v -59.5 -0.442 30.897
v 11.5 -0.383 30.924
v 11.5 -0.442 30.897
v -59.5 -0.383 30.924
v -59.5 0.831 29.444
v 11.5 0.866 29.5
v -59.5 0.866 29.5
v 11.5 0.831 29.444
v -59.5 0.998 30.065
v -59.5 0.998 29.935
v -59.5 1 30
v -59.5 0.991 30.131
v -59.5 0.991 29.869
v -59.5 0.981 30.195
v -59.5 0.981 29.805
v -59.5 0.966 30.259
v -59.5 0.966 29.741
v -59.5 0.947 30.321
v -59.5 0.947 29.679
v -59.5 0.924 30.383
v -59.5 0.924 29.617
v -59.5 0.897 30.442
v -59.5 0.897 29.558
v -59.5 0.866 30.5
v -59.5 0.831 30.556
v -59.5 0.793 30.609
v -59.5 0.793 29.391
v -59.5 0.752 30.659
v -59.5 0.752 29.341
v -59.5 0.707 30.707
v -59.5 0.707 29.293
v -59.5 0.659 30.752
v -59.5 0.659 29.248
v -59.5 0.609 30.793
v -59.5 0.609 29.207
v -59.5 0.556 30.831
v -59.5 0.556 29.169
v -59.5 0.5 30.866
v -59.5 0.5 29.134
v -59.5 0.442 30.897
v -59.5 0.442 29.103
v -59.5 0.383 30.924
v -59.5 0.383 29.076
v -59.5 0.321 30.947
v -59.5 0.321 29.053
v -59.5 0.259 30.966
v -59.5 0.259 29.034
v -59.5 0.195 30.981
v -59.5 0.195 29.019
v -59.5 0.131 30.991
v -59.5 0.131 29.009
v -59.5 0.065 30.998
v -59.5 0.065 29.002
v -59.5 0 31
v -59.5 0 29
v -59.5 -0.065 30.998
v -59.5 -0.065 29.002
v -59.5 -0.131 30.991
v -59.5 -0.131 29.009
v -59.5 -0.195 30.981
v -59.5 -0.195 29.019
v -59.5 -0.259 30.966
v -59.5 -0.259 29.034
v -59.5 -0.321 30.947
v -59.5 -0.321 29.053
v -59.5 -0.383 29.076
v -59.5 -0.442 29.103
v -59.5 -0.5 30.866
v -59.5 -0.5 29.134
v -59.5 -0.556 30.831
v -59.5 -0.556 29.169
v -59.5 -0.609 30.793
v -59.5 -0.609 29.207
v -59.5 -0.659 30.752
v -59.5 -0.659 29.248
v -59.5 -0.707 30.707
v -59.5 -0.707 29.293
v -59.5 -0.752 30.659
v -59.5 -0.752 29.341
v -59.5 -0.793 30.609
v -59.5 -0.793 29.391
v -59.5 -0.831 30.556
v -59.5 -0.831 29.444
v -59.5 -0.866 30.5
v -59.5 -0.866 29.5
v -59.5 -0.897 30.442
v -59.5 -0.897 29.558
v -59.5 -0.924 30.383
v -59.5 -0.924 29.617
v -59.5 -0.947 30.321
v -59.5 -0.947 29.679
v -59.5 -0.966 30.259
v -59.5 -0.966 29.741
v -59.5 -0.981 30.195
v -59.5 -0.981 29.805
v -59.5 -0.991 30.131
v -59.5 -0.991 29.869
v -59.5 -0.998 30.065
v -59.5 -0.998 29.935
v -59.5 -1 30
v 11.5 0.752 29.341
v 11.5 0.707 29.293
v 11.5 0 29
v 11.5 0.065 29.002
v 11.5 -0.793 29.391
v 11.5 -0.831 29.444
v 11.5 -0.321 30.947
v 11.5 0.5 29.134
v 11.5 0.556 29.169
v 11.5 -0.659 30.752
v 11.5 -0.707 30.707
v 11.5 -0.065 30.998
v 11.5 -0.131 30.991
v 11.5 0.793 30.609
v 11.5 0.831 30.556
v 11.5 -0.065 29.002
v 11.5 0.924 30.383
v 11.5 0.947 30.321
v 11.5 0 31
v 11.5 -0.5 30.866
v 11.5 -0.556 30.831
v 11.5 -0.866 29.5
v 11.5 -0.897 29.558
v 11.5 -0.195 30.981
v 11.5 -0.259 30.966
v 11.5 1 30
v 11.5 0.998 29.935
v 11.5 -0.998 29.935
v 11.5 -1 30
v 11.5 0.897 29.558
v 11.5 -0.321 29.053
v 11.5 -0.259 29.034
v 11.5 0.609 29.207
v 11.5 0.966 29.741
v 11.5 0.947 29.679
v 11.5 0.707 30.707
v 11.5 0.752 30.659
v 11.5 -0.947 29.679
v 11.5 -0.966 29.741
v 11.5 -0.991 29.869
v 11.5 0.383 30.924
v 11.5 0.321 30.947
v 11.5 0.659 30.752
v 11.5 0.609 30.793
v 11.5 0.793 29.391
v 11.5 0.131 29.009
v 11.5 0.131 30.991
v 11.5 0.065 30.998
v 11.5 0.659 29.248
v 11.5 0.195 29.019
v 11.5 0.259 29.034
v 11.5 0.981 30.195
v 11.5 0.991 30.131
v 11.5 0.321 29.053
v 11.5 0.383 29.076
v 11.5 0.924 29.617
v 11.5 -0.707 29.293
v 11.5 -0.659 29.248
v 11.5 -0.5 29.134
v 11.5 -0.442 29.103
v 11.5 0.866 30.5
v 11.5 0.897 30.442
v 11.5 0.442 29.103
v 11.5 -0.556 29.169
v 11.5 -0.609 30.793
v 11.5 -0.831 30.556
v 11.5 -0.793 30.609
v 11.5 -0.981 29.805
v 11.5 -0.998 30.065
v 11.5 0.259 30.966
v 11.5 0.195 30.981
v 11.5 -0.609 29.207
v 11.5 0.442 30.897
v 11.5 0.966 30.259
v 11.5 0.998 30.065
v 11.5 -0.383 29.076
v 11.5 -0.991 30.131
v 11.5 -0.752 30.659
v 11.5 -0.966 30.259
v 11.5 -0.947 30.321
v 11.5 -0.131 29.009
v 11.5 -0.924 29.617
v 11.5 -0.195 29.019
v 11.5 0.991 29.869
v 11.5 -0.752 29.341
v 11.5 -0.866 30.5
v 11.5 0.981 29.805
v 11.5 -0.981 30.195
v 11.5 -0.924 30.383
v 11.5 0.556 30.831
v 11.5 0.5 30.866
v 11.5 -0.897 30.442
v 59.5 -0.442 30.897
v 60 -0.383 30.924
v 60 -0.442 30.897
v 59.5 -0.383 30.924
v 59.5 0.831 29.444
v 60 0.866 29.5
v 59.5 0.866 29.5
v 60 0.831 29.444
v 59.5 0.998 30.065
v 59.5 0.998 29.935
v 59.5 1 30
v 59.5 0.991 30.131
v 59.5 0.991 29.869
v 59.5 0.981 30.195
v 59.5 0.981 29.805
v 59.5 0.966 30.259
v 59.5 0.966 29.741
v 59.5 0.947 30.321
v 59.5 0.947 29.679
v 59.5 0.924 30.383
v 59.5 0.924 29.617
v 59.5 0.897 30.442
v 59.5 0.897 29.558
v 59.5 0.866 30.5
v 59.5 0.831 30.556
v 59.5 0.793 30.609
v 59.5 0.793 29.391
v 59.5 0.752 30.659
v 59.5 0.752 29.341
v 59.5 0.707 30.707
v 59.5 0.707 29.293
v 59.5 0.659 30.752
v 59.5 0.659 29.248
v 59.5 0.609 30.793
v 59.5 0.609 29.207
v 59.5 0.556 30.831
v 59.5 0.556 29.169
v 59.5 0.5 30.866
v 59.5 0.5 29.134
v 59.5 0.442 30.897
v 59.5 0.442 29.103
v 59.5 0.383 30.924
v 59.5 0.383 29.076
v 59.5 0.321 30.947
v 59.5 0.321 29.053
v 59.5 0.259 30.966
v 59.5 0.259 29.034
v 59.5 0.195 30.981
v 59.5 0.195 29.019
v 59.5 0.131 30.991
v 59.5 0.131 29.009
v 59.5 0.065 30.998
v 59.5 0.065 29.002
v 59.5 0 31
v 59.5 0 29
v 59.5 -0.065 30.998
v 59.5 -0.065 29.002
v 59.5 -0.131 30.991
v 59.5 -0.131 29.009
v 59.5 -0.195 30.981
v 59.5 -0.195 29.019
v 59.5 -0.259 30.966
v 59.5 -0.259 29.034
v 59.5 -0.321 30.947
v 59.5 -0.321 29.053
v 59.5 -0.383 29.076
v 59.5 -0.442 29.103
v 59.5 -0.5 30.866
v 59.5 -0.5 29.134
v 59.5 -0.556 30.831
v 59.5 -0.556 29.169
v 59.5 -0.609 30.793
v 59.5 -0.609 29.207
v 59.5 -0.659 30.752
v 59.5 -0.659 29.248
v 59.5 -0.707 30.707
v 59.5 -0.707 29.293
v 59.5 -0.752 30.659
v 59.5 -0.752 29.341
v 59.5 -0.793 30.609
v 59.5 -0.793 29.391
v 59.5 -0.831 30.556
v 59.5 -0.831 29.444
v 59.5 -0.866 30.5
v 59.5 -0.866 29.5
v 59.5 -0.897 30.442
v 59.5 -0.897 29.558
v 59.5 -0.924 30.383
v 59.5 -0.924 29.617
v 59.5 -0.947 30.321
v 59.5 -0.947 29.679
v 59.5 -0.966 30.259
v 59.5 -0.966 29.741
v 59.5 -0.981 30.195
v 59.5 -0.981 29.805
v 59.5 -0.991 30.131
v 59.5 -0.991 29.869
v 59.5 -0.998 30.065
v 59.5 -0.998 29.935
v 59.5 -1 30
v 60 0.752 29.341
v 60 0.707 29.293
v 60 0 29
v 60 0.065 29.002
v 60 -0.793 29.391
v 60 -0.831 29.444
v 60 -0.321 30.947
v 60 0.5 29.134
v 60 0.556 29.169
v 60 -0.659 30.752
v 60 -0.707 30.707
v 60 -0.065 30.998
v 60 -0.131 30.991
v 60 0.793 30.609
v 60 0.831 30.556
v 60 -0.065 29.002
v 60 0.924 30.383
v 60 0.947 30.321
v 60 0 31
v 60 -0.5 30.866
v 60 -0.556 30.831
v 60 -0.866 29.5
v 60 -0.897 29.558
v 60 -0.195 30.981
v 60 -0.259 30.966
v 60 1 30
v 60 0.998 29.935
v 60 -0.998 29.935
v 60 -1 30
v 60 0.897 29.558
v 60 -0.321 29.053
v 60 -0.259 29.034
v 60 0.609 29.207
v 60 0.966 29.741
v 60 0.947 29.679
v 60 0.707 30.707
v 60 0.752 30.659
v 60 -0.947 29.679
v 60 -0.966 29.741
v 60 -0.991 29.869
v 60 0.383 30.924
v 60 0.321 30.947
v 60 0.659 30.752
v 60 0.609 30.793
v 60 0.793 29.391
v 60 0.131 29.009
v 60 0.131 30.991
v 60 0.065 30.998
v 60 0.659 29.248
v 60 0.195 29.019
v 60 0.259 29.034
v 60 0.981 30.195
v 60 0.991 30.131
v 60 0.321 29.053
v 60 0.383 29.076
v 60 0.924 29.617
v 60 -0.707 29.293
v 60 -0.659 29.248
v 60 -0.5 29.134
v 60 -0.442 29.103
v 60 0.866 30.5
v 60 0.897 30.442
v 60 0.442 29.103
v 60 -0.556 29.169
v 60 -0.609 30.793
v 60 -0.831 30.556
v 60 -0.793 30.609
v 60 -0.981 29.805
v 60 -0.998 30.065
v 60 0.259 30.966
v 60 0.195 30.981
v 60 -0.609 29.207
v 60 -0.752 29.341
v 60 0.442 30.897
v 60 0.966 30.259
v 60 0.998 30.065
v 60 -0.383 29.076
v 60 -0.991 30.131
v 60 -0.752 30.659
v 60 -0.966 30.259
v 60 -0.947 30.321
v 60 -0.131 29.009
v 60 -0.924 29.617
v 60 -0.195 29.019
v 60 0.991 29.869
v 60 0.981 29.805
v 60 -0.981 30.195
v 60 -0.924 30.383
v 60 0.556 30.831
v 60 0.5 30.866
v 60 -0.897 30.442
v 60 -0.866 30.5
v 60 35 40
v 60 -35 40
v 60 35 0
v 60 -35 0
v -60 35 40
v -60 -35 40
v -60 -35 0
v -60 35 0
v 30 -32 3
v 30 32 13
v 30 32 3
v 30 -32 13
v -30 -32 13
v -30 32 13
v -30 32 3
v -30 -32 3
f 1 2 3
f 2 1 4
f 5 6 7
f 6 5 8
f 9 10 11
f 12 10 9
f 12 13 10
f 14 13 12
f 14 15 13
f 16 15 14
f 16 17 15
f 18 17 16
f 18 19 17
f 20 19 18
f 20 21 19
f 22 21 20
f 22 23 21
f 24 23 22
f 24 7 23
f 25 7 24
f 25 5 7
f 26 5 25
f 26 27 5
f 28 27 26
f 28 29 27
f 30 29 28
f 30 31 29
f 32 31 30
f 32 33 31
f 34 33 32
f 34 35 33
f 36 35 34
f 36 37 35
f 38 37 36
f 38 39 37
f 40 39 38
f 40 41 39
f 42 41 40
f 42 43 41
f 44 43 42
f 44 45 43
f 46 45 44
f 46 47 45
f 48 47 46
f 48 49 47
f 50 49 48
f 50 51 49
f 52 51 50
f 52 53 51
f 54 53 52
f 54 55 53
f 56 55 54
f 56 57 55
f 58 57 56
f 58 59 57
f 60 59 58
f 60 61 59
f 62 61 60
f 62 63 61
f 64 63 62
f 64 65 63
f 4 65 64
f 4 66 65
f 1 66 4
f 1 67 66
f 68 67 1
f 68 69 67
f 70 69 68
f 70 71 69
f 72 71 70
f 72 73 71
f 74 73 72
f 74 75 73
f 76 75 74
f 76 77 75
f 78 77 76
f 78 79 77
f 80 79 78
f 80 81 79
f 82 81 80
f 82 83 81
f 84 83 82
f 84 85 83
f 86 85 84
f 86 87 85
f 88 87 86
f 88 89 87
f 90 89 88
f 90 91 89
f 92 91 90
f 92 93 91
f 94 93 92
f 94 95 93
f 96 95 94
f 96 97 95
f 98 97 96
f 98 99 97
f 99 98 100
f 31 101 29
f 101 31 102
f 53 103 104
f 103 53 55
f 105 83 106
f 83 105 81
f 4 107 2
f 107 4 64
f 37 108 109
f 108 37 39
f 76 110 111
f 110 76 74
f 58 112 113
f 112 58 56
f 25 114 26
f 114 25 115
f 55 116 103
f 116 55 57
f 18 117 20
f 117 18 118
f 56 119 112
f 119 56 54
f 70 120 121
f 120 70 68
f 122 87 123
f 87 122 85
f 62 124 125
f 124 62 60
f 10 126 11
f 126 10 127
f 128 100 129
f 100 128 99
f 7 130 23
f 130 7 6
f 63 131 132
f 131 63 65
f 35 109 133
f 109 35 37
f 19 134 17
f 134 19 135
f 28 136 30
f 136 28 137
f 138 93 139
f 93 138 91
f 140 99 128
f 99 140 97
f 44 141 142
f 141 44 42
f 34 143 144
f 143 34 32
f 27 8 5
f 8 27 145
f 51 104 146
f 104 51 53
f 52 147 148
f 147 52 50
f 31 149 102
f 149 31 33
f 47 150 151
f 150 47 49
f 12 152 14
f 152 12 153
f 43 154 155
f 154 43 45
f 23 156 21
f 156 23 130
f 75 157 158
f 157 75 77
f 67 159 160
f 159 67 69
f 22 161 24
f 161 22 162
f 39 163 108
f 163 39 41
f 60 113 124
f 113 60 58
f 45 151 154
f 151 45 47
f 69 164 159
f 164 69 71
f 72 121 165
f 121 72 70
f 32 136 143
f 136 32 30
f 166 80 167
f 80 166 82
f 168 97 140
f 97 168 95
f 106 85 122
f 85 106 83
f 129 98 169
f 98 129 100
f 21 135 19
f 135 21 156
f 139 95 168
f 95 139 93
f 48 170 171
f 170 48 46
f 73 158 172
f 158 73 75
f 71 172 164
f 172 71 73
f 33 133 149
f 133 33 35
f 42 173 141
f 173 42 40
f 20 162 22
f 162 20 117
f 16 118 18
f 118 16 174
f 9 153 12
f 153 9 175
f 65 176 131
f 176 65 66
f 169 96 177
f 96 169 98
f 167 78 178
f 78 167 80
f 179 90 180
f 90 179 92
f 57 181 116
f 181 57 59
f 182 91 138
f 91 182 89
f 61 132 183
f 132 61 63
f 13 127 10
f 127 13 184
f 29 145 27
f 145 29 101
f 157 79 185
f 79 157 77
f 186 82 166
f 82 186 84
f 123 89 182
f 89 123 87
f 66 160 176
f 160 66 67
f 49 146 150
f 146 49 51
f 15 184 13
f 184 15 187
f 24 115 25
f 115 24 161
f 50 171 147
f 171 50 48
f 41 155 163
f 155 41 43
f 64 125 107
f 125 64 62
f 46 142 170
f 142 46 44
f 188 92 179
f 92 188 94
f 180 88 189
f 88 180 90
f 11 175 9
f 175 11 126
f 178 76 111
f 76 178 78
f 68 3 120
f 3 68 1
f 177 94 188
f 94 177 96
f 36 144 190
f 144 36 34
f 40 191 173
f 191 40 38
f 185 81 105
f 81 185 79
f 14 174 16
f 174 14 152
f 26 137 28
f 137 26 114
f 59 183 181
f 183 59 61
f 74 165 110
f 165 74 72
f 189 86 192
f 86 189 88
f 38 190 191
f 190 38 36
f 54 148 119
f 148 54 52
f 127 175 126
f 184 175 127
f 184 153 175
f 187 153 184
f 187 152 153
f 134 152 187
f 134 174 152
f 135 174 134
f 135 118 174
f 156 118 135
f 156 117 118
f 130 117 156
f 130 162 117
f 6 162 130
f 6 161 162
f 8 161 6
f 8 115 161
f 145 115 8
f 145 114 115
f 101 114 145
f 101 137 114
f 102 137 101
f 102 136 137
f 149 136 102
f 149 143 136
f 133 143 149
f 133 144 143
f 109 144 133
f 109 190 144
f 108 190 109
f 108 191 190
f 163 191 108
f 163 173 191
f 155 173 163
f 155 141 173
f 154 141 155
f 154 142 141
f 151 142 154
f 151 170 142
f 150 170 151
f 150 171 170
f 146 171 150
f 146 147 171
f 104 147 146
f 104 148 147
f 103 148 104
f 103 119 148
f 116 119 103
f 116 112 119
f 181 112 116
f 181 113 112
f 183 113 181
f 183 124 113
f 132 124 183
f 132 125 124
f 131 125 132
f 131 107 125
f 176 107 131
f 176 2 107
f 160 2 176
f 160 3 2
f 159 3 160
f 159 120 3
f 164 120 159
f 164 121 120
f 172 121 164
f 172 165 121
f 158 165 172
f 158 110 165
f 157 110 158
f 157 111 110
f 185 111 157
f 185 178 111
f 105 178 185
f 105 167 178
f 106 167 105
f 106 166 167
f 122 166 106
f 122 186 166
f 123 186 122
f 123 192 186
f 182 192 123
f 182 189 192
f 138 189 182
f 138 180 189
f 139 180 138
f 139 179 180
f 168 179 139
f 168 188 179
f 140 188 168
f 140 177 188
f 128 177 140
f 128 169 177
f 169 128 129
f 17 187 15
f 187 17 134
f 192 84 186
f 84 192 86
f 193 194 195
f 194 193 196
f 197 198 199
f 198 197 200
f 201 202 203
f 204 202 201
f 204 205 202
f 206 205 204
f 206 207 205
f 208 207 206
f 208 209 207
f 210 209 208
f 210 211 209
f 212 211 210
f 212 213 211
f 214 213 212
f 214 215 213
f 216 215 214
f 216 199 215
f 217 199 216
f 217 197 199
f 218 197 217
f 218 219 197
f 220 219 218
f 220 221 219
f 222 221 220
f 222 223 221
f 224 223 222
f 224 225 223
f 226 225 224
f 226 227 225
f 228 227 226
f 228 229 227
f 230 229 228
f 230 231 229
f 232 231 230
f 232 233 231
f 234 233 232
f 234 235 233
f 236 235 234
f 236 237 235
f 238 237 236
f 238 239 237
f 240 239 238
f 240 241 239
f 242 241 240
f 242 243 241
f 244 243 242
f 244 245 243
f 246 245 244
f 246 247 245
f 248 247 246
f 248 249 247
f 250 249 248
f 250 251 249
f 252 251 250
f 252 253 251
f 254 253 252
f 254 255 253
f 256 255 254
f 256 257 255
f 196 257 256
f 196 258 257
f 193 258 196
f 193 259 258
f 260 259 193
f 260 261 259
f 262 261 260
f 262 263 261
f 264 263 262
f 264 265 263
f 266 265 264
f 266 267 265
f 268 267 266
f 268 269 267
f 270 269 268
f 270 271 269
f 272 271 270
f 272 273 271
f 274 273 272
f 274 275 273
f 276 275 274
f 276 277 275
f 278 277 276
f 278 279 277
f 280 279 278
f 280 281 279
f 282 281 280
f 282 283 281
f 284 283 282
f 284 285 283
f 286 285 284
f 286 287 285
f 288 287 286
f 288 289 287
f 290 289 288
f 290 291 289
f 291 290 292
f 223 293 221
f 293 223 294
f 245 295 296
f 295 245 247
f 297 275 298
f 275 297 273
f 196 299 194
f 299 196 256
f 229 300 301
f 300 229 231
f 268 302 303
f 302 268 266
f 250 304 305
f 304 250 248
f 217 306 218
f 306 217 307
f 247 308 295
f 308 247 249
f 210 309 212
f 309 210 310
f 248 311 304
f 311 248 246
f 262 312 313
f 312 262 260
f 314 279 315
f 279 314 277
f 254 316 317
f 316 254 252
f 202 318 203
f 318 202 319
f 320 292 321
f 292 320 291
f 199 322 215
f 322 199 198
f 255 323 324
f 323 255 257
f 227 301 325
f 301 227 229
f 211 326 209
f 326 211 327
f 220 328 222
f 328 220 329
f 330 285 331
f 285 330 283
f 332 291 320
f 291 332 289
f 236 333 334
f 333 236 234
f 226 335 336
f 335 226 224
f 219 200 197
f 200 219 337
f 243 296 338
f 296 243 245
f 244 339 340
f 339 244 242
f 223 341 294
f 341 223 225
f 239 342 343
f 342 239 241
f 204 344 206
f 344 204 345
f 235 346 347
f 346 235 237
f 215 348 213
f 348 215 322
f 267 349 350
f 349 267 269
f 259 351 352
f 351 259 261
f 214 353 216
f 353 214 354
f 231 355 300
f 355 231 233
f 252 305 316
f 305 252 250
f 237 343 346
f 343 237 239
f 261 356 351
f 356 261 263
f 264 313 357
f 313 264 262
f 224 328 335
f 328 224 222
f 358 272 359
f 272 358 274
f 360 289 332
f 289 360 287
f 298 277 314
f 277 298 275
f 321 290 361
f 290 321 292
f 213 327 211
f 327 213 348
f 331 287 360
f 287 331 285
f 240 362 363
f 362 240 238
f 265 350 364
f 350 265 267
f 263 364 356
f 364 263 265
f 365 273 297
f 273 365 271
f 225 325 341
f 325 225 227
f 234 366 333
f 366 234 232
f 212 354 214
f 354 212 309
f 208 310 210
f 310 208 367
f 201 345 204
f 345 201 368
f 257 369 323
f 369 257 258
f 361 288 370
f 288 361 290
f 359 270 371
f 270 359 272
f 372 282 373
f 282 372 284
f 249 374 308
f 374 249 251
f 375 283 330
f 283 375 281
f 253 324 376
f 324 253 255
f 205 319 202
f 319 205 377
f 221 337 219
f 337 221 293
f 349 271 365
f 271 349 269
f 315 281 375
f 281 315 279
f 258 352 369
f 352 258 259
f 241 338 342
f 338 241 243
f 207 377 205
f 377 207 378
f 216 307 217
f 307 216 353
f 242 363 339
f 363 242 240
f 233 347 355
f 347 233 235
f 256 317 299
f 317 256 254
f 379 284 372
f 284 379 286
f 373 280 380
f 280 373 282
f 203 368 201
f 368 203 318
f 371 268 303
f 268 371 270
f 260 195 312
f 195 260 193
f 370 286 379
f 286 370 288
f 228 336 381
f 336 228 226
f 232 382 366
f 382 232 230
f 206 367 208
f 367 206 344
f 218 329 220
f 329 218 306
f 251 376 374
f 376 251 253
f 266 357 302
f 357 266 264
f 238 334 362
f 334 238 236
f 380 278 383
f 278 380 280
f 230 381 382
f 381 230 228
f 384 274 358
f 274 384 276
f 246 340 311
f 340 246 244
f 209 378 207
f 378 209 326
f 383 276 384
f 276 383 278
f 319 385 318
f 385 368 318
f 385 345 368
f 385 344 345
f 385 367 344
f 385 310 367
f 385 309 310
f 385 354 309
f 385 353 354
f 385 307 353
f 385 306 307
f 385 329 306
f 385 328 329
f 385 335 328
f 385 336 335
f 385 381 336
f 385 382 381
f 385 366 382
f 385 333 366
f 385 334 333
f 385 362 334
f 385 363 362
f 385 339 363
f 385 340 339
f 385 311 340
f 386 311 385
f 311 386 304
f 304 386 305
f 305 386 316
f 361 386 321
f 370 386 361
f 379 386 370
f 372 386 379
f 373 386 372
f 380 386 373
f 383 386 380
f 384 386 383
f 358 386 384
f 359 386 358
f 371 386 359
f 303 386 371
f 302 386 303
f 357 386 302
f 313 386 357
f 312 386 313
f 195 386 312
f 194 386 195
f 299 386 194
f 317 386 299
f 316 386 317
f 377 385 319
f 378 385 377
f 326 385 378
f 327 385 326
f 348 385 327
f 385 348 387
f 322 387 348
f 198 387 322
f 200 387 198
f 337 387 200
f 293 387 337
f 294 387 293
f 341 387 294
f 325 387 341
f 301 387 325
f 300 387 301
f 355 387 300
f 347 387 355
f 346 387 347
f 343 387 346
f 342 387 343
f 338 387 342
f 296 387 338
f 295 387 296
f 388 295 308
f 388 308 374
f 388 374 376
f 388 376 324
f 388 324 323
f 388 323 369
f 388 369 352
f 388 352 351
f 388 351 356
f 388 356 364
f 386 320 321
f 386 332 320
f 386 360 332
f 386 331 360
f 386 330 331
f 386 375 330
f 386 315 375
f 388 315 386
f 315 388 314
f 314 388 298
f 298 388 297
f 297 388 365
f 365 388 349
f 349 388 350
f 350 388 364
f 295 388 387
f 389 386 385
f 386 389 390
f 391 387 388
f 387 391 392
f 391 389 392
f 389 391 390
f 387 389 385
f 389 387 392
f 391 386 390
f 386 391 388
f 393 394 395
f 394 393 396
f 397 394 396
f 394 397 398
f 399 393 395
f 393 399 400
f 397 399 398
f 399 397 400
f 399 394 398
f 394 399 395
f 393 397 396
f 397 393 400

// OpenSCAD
// Mini horizontal gel-electrophoresis box - buffer tank
// Print orientation: tank rests on XY plane at z = 0, builds upward (+Z)

// ---------------- Parameters ----------------
tank_x      = 120;   // outer length in X (mm)
tank_y      = 70;    // outer width in Y (mm)
tank_h      = 40;    // outer height in Z (mm)
wall        = 3;     // wall thickness (mm)
floor       = 3;     // floor thickness (mm)

platform_x  = 60;    // platform length in X (mm), centred
platform_y  = tank_y - 2 * wall;  // platform spans full inner width (mm)
platform_z  = 13;    // platform top height above outer bottom (mm)

hole_d      = 2;     // electrode hole diameter (mm)
hole_y      = 0;     // hole centre Y (mm)
hole_z      = 30;    // hole centre Z (mm)

eps         = 0.5;   // cutter overshoot past faces (mm)
$fn         = 96;    // curve resolution

// ---------------- Derived ----------------
inner_h = tank_h - floor;              // 37 mm inner floor-to-top height
pl_th   = platform_z - floor;          // 10 mm platform thickness above floor

// ---------------- Model ----------------
difference() {
    // Tank body: open-top rectangular box with floor
    translate([-tank_x / 2, -tank_y / 2, 0])
        cube([tank_x, tank_y, tank_h]);

    // Gel-tray platform, centred in X, spanning full inner width
    translate([-platform_x / 2, -platform_y / 2, floor])
        cube([platform_x, platform_y, pl_th]);

    // Horizontal electrode holes through each end wall, along X
    for (sx = [-1, 1])
        translate([sx * (tank_x / 2 - eps), hole_y, hole_z])
            rotate([0, 90, 0])
                cylinder(d = hole_d, h = tank_y + 2 * eps);
}
